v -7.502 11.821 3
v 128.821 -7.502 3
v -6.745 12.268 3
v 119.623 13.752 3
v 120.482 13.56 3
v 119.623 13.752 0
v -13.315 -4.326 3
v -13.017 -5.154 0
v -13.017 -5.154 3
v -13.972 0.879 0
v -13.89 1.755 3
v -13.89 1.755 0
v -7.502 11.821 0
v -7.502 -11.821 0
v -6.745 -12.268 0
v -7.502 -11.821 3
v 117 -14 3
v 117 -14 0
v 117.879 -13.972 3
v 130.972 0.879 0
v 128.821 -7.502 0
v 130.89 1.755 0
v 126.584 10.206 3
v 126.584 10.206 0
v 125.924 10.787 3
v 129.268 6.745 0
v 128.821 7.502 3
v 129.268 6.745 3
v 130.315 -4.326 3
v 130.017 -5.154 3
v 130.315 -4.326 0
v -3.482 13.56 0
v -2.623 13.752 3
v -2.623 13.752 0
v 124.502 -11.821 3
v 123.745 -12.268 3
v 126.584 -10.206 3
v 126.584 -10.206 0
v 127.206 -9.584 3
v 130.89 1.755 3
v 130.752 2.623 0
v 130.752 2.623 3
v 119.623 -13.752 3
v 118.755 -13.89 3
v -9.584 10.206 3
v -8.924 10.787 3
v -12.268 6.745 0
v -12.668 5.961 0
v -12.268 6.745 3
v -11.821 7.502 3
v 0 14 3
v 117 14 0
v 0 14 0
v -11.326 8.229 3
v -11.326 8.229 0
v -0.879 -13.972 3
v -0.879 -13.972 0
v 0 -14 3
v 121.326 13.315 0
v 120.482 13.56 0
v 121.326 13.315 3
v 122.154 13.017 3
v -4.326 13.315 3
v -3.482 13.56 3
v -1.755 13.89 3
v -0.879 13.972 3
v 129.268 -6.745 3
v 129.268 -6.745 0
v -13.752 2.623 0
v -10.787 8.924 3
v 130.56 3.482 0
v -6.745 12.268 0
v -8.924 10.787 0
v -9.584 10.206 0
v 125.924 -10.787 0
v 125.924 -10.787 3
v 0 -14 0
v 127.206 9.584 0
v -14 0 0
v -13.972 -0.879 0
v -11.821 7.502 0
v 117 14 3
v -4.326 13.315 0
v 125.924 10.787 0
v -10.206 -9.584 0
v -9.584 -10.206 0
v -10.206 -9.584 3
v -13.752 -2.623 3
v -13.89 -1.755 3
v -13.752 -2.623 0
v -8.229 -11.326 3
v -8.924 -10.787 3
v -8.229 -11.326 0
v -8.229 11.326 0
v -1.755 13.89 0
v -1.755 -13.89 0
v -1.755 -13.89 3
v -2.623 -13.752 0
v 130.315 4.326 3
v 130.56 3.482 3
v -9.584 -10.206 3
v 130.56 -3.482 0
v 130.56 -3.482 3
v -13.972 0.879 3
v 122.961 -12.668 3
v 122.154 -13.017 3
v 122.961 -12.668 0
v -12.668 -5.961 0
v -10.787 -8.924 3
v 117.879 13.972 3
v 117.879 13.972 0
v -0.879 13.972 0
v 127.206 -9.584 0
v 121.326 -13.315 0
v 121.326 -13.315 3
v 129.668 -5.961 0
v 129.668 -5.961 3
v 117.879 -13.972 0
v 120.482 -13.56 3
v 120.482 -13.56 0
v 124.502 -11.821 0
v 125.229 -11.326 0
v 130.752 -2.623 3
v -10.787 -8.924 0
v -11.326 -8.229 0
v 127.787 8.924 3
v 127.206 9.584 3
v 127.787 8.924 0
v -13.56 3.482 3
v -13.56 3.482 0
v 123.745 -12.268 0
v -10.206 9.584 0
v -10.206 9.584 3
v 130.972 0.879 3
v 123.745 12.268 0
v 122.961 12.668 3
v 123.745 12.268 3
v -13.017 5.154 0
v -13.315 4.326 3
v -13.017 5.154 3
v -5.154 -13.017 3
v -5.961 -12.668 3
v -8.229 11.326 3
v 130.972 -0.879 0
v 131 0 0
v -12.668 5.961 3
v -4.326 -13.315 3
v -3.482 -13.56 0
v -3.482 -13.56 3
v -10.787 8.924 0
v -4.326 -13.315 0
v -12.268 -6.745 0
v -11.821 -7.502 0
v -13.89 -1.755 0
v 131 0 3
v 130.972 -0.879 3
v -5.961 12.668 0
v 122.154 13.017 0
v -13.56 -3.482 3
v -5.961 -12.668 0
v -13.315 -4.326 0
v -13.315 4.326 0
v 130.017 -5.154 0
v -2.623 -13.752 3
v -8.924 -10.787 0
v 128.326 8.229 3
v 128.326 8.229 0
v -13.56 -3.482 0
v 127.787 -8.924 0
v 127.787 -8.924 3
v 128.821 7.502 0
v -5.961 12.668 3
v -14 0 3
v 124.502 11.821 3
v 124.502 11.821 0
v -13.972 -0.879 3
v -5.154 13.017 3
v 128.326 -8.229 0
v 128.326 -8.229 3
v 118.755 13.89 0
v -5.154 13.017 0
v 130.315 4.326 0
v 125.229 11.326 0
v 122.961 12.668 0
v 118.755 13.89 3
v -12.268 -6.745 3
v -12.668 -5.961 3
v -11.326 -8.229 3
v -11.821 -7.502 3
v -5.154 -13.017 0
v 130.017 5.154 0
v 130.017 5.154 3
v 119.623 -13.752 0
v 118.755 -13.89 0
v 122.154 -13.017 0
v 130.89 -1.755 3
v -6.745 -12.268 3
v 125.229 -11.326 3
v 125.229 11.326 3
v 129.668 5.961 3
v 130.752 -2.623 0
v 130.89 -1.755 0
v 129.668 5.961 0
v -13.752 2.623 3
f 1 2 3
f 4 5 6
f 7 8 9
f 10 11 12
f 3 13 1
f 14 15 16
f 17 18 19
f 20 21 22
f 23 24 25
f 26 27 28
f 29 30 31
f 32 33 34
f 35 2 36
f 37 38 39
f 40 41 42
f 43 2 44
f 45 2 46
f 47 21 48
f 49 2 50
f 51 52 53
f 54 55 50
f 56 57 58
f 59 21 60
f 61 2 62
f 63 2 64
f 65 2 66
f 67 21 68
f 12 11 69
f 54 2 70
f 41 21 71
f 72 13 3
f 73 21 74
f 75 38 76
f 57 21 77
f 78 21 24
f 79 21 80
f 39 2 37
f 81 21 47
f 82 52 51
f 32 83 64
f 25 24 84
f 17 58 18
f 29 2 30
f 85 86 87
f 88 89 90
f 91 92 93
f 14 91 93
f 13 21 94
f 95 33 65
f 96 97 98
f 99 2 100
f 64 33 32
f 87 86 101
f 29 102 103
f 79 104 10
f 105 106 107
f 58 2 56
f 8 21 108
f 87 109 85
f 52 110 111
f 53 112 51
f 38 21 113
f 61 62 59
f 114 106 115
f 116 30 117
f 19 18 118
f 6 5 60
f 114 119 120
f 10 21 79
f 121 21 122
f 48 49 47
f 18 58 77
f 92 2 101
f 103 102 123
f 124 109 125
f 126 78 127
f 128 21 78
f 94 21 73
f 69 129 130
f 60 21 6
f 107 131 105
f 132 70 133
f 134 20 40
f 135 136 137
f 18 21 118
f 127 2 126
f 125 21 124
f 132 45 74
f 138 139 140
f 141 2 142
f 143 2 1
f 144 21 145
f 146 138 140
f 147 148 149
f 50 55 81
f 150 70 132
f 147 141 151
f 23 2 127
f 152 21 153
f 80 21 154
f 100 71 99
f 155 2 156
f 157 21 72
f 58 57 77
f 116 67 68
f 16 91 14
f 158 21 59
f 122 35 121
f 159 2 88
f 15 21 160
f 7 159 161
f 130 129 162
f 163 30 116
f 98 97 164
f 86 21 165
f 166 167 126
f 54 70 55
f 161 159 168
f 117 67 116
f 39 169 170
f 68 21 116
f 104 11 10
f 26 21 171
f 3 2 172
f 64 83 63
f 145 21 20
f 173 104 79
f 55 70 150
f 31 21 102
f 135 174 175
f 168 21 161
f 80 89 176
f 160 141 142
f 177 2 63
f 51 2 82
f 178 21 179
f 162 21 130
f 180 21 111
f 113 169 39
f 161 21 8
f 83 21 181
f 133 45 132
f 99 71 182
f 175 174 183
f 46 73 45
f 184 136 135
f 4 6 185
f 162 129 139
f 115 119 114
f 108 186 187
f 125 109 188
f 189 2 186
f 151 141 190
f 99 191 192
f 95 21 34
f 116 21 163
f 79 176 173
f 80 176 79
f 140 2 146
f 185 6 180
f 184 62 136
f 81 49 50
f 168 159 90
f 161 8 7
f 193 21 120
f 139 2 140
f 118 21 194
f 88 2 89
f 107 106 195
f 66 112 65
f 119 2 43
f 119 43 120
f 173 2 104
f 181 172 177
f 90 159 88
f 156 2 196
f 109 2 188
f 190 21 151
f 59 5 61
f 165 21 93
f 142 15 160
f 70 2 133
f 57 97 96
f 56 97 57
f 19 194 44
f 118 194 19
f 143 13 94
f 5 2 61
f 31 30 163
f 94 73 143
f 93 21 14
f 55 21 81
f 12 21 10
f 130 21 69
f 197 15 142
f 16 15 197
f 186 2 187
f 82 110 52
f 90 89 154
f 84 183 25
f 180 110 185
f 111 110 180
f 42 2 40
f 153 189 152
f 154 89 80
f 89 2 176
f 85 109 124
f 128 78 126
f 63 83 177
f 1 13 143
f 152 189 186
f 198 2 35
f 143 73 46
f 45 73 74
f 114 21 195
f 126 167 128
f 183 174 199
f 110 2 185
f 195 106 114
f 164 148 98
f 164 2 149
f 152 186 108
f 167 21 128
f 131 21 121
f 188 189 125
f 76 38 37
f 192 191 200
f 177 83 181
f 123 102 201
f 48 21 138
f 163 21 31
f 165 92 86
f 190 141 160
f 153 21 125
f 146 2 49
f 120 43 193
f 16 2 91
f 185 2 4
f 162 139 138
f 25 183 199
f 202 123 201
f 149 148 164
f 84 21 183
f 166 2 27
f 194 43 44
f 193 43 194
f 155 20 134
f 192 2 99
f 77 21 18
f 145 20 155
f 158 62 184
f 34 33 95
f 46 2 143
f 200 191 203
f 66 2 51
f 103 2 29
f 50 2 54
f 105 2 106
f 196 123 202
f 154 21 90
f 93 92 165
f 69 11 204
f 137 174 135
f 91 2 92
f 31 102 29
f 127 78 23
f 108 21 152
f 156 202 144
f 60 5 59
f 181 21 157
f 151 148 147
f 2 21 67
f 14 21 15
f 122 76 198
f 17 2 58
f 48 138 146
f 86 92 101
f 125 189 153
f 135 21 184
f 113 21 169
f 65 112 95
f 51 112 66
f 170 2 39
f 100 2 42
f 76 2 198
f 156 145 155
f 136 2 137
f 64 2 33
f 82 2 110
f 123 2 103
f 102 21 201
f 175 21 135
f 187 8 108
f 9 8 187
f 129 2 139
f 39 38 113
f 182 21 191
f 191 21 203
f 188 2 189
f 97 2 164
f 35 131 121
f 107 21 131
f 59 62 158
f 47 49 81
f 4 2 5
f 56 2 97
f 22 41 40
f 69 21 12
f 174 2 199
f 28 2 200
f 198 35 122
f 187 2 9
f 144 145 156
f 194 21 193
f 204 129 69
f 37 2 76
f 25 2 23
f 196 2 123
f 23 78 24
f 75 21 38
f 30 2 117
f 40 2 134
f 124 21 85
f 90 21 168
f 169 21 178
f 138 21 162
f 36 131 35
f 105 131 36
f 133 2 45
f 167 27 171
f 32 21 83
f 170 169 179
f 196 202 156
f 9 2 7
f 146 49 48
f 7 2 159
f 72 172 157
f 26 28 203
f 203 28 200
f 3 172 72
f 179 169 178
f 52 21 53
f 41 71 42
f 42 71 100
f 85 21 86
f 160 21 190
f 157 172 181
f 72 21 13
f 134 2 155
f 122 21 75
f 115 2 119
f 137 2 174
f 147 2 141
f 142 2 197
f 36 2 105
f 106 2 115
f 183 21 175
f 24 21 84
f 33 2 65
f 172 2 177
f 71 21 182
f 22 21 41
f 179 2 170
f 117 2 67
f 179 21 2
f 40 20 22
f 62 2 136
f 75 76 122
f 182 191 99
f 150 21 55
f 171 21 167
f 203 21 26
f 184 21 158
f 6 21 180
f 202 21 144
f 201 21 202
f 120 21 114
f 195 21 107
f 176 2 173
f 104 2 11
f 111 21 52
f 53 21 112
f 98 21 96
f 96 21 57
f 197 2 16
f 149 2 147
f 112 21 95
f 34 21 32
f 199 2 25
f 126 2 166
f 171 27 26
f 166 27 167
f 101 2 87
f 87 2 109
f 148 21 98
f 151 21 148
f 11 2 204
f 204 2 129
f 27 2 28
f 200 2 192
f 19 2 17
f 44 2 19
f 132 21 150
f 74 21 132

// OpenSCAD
$fn = 100;

hull() {
  for (x = [0:145 - 28:145 - 28]) {
    translate(v = [ x, 0, 0 ]) { cylinder(h = 3, r = 14); }
  }
}
